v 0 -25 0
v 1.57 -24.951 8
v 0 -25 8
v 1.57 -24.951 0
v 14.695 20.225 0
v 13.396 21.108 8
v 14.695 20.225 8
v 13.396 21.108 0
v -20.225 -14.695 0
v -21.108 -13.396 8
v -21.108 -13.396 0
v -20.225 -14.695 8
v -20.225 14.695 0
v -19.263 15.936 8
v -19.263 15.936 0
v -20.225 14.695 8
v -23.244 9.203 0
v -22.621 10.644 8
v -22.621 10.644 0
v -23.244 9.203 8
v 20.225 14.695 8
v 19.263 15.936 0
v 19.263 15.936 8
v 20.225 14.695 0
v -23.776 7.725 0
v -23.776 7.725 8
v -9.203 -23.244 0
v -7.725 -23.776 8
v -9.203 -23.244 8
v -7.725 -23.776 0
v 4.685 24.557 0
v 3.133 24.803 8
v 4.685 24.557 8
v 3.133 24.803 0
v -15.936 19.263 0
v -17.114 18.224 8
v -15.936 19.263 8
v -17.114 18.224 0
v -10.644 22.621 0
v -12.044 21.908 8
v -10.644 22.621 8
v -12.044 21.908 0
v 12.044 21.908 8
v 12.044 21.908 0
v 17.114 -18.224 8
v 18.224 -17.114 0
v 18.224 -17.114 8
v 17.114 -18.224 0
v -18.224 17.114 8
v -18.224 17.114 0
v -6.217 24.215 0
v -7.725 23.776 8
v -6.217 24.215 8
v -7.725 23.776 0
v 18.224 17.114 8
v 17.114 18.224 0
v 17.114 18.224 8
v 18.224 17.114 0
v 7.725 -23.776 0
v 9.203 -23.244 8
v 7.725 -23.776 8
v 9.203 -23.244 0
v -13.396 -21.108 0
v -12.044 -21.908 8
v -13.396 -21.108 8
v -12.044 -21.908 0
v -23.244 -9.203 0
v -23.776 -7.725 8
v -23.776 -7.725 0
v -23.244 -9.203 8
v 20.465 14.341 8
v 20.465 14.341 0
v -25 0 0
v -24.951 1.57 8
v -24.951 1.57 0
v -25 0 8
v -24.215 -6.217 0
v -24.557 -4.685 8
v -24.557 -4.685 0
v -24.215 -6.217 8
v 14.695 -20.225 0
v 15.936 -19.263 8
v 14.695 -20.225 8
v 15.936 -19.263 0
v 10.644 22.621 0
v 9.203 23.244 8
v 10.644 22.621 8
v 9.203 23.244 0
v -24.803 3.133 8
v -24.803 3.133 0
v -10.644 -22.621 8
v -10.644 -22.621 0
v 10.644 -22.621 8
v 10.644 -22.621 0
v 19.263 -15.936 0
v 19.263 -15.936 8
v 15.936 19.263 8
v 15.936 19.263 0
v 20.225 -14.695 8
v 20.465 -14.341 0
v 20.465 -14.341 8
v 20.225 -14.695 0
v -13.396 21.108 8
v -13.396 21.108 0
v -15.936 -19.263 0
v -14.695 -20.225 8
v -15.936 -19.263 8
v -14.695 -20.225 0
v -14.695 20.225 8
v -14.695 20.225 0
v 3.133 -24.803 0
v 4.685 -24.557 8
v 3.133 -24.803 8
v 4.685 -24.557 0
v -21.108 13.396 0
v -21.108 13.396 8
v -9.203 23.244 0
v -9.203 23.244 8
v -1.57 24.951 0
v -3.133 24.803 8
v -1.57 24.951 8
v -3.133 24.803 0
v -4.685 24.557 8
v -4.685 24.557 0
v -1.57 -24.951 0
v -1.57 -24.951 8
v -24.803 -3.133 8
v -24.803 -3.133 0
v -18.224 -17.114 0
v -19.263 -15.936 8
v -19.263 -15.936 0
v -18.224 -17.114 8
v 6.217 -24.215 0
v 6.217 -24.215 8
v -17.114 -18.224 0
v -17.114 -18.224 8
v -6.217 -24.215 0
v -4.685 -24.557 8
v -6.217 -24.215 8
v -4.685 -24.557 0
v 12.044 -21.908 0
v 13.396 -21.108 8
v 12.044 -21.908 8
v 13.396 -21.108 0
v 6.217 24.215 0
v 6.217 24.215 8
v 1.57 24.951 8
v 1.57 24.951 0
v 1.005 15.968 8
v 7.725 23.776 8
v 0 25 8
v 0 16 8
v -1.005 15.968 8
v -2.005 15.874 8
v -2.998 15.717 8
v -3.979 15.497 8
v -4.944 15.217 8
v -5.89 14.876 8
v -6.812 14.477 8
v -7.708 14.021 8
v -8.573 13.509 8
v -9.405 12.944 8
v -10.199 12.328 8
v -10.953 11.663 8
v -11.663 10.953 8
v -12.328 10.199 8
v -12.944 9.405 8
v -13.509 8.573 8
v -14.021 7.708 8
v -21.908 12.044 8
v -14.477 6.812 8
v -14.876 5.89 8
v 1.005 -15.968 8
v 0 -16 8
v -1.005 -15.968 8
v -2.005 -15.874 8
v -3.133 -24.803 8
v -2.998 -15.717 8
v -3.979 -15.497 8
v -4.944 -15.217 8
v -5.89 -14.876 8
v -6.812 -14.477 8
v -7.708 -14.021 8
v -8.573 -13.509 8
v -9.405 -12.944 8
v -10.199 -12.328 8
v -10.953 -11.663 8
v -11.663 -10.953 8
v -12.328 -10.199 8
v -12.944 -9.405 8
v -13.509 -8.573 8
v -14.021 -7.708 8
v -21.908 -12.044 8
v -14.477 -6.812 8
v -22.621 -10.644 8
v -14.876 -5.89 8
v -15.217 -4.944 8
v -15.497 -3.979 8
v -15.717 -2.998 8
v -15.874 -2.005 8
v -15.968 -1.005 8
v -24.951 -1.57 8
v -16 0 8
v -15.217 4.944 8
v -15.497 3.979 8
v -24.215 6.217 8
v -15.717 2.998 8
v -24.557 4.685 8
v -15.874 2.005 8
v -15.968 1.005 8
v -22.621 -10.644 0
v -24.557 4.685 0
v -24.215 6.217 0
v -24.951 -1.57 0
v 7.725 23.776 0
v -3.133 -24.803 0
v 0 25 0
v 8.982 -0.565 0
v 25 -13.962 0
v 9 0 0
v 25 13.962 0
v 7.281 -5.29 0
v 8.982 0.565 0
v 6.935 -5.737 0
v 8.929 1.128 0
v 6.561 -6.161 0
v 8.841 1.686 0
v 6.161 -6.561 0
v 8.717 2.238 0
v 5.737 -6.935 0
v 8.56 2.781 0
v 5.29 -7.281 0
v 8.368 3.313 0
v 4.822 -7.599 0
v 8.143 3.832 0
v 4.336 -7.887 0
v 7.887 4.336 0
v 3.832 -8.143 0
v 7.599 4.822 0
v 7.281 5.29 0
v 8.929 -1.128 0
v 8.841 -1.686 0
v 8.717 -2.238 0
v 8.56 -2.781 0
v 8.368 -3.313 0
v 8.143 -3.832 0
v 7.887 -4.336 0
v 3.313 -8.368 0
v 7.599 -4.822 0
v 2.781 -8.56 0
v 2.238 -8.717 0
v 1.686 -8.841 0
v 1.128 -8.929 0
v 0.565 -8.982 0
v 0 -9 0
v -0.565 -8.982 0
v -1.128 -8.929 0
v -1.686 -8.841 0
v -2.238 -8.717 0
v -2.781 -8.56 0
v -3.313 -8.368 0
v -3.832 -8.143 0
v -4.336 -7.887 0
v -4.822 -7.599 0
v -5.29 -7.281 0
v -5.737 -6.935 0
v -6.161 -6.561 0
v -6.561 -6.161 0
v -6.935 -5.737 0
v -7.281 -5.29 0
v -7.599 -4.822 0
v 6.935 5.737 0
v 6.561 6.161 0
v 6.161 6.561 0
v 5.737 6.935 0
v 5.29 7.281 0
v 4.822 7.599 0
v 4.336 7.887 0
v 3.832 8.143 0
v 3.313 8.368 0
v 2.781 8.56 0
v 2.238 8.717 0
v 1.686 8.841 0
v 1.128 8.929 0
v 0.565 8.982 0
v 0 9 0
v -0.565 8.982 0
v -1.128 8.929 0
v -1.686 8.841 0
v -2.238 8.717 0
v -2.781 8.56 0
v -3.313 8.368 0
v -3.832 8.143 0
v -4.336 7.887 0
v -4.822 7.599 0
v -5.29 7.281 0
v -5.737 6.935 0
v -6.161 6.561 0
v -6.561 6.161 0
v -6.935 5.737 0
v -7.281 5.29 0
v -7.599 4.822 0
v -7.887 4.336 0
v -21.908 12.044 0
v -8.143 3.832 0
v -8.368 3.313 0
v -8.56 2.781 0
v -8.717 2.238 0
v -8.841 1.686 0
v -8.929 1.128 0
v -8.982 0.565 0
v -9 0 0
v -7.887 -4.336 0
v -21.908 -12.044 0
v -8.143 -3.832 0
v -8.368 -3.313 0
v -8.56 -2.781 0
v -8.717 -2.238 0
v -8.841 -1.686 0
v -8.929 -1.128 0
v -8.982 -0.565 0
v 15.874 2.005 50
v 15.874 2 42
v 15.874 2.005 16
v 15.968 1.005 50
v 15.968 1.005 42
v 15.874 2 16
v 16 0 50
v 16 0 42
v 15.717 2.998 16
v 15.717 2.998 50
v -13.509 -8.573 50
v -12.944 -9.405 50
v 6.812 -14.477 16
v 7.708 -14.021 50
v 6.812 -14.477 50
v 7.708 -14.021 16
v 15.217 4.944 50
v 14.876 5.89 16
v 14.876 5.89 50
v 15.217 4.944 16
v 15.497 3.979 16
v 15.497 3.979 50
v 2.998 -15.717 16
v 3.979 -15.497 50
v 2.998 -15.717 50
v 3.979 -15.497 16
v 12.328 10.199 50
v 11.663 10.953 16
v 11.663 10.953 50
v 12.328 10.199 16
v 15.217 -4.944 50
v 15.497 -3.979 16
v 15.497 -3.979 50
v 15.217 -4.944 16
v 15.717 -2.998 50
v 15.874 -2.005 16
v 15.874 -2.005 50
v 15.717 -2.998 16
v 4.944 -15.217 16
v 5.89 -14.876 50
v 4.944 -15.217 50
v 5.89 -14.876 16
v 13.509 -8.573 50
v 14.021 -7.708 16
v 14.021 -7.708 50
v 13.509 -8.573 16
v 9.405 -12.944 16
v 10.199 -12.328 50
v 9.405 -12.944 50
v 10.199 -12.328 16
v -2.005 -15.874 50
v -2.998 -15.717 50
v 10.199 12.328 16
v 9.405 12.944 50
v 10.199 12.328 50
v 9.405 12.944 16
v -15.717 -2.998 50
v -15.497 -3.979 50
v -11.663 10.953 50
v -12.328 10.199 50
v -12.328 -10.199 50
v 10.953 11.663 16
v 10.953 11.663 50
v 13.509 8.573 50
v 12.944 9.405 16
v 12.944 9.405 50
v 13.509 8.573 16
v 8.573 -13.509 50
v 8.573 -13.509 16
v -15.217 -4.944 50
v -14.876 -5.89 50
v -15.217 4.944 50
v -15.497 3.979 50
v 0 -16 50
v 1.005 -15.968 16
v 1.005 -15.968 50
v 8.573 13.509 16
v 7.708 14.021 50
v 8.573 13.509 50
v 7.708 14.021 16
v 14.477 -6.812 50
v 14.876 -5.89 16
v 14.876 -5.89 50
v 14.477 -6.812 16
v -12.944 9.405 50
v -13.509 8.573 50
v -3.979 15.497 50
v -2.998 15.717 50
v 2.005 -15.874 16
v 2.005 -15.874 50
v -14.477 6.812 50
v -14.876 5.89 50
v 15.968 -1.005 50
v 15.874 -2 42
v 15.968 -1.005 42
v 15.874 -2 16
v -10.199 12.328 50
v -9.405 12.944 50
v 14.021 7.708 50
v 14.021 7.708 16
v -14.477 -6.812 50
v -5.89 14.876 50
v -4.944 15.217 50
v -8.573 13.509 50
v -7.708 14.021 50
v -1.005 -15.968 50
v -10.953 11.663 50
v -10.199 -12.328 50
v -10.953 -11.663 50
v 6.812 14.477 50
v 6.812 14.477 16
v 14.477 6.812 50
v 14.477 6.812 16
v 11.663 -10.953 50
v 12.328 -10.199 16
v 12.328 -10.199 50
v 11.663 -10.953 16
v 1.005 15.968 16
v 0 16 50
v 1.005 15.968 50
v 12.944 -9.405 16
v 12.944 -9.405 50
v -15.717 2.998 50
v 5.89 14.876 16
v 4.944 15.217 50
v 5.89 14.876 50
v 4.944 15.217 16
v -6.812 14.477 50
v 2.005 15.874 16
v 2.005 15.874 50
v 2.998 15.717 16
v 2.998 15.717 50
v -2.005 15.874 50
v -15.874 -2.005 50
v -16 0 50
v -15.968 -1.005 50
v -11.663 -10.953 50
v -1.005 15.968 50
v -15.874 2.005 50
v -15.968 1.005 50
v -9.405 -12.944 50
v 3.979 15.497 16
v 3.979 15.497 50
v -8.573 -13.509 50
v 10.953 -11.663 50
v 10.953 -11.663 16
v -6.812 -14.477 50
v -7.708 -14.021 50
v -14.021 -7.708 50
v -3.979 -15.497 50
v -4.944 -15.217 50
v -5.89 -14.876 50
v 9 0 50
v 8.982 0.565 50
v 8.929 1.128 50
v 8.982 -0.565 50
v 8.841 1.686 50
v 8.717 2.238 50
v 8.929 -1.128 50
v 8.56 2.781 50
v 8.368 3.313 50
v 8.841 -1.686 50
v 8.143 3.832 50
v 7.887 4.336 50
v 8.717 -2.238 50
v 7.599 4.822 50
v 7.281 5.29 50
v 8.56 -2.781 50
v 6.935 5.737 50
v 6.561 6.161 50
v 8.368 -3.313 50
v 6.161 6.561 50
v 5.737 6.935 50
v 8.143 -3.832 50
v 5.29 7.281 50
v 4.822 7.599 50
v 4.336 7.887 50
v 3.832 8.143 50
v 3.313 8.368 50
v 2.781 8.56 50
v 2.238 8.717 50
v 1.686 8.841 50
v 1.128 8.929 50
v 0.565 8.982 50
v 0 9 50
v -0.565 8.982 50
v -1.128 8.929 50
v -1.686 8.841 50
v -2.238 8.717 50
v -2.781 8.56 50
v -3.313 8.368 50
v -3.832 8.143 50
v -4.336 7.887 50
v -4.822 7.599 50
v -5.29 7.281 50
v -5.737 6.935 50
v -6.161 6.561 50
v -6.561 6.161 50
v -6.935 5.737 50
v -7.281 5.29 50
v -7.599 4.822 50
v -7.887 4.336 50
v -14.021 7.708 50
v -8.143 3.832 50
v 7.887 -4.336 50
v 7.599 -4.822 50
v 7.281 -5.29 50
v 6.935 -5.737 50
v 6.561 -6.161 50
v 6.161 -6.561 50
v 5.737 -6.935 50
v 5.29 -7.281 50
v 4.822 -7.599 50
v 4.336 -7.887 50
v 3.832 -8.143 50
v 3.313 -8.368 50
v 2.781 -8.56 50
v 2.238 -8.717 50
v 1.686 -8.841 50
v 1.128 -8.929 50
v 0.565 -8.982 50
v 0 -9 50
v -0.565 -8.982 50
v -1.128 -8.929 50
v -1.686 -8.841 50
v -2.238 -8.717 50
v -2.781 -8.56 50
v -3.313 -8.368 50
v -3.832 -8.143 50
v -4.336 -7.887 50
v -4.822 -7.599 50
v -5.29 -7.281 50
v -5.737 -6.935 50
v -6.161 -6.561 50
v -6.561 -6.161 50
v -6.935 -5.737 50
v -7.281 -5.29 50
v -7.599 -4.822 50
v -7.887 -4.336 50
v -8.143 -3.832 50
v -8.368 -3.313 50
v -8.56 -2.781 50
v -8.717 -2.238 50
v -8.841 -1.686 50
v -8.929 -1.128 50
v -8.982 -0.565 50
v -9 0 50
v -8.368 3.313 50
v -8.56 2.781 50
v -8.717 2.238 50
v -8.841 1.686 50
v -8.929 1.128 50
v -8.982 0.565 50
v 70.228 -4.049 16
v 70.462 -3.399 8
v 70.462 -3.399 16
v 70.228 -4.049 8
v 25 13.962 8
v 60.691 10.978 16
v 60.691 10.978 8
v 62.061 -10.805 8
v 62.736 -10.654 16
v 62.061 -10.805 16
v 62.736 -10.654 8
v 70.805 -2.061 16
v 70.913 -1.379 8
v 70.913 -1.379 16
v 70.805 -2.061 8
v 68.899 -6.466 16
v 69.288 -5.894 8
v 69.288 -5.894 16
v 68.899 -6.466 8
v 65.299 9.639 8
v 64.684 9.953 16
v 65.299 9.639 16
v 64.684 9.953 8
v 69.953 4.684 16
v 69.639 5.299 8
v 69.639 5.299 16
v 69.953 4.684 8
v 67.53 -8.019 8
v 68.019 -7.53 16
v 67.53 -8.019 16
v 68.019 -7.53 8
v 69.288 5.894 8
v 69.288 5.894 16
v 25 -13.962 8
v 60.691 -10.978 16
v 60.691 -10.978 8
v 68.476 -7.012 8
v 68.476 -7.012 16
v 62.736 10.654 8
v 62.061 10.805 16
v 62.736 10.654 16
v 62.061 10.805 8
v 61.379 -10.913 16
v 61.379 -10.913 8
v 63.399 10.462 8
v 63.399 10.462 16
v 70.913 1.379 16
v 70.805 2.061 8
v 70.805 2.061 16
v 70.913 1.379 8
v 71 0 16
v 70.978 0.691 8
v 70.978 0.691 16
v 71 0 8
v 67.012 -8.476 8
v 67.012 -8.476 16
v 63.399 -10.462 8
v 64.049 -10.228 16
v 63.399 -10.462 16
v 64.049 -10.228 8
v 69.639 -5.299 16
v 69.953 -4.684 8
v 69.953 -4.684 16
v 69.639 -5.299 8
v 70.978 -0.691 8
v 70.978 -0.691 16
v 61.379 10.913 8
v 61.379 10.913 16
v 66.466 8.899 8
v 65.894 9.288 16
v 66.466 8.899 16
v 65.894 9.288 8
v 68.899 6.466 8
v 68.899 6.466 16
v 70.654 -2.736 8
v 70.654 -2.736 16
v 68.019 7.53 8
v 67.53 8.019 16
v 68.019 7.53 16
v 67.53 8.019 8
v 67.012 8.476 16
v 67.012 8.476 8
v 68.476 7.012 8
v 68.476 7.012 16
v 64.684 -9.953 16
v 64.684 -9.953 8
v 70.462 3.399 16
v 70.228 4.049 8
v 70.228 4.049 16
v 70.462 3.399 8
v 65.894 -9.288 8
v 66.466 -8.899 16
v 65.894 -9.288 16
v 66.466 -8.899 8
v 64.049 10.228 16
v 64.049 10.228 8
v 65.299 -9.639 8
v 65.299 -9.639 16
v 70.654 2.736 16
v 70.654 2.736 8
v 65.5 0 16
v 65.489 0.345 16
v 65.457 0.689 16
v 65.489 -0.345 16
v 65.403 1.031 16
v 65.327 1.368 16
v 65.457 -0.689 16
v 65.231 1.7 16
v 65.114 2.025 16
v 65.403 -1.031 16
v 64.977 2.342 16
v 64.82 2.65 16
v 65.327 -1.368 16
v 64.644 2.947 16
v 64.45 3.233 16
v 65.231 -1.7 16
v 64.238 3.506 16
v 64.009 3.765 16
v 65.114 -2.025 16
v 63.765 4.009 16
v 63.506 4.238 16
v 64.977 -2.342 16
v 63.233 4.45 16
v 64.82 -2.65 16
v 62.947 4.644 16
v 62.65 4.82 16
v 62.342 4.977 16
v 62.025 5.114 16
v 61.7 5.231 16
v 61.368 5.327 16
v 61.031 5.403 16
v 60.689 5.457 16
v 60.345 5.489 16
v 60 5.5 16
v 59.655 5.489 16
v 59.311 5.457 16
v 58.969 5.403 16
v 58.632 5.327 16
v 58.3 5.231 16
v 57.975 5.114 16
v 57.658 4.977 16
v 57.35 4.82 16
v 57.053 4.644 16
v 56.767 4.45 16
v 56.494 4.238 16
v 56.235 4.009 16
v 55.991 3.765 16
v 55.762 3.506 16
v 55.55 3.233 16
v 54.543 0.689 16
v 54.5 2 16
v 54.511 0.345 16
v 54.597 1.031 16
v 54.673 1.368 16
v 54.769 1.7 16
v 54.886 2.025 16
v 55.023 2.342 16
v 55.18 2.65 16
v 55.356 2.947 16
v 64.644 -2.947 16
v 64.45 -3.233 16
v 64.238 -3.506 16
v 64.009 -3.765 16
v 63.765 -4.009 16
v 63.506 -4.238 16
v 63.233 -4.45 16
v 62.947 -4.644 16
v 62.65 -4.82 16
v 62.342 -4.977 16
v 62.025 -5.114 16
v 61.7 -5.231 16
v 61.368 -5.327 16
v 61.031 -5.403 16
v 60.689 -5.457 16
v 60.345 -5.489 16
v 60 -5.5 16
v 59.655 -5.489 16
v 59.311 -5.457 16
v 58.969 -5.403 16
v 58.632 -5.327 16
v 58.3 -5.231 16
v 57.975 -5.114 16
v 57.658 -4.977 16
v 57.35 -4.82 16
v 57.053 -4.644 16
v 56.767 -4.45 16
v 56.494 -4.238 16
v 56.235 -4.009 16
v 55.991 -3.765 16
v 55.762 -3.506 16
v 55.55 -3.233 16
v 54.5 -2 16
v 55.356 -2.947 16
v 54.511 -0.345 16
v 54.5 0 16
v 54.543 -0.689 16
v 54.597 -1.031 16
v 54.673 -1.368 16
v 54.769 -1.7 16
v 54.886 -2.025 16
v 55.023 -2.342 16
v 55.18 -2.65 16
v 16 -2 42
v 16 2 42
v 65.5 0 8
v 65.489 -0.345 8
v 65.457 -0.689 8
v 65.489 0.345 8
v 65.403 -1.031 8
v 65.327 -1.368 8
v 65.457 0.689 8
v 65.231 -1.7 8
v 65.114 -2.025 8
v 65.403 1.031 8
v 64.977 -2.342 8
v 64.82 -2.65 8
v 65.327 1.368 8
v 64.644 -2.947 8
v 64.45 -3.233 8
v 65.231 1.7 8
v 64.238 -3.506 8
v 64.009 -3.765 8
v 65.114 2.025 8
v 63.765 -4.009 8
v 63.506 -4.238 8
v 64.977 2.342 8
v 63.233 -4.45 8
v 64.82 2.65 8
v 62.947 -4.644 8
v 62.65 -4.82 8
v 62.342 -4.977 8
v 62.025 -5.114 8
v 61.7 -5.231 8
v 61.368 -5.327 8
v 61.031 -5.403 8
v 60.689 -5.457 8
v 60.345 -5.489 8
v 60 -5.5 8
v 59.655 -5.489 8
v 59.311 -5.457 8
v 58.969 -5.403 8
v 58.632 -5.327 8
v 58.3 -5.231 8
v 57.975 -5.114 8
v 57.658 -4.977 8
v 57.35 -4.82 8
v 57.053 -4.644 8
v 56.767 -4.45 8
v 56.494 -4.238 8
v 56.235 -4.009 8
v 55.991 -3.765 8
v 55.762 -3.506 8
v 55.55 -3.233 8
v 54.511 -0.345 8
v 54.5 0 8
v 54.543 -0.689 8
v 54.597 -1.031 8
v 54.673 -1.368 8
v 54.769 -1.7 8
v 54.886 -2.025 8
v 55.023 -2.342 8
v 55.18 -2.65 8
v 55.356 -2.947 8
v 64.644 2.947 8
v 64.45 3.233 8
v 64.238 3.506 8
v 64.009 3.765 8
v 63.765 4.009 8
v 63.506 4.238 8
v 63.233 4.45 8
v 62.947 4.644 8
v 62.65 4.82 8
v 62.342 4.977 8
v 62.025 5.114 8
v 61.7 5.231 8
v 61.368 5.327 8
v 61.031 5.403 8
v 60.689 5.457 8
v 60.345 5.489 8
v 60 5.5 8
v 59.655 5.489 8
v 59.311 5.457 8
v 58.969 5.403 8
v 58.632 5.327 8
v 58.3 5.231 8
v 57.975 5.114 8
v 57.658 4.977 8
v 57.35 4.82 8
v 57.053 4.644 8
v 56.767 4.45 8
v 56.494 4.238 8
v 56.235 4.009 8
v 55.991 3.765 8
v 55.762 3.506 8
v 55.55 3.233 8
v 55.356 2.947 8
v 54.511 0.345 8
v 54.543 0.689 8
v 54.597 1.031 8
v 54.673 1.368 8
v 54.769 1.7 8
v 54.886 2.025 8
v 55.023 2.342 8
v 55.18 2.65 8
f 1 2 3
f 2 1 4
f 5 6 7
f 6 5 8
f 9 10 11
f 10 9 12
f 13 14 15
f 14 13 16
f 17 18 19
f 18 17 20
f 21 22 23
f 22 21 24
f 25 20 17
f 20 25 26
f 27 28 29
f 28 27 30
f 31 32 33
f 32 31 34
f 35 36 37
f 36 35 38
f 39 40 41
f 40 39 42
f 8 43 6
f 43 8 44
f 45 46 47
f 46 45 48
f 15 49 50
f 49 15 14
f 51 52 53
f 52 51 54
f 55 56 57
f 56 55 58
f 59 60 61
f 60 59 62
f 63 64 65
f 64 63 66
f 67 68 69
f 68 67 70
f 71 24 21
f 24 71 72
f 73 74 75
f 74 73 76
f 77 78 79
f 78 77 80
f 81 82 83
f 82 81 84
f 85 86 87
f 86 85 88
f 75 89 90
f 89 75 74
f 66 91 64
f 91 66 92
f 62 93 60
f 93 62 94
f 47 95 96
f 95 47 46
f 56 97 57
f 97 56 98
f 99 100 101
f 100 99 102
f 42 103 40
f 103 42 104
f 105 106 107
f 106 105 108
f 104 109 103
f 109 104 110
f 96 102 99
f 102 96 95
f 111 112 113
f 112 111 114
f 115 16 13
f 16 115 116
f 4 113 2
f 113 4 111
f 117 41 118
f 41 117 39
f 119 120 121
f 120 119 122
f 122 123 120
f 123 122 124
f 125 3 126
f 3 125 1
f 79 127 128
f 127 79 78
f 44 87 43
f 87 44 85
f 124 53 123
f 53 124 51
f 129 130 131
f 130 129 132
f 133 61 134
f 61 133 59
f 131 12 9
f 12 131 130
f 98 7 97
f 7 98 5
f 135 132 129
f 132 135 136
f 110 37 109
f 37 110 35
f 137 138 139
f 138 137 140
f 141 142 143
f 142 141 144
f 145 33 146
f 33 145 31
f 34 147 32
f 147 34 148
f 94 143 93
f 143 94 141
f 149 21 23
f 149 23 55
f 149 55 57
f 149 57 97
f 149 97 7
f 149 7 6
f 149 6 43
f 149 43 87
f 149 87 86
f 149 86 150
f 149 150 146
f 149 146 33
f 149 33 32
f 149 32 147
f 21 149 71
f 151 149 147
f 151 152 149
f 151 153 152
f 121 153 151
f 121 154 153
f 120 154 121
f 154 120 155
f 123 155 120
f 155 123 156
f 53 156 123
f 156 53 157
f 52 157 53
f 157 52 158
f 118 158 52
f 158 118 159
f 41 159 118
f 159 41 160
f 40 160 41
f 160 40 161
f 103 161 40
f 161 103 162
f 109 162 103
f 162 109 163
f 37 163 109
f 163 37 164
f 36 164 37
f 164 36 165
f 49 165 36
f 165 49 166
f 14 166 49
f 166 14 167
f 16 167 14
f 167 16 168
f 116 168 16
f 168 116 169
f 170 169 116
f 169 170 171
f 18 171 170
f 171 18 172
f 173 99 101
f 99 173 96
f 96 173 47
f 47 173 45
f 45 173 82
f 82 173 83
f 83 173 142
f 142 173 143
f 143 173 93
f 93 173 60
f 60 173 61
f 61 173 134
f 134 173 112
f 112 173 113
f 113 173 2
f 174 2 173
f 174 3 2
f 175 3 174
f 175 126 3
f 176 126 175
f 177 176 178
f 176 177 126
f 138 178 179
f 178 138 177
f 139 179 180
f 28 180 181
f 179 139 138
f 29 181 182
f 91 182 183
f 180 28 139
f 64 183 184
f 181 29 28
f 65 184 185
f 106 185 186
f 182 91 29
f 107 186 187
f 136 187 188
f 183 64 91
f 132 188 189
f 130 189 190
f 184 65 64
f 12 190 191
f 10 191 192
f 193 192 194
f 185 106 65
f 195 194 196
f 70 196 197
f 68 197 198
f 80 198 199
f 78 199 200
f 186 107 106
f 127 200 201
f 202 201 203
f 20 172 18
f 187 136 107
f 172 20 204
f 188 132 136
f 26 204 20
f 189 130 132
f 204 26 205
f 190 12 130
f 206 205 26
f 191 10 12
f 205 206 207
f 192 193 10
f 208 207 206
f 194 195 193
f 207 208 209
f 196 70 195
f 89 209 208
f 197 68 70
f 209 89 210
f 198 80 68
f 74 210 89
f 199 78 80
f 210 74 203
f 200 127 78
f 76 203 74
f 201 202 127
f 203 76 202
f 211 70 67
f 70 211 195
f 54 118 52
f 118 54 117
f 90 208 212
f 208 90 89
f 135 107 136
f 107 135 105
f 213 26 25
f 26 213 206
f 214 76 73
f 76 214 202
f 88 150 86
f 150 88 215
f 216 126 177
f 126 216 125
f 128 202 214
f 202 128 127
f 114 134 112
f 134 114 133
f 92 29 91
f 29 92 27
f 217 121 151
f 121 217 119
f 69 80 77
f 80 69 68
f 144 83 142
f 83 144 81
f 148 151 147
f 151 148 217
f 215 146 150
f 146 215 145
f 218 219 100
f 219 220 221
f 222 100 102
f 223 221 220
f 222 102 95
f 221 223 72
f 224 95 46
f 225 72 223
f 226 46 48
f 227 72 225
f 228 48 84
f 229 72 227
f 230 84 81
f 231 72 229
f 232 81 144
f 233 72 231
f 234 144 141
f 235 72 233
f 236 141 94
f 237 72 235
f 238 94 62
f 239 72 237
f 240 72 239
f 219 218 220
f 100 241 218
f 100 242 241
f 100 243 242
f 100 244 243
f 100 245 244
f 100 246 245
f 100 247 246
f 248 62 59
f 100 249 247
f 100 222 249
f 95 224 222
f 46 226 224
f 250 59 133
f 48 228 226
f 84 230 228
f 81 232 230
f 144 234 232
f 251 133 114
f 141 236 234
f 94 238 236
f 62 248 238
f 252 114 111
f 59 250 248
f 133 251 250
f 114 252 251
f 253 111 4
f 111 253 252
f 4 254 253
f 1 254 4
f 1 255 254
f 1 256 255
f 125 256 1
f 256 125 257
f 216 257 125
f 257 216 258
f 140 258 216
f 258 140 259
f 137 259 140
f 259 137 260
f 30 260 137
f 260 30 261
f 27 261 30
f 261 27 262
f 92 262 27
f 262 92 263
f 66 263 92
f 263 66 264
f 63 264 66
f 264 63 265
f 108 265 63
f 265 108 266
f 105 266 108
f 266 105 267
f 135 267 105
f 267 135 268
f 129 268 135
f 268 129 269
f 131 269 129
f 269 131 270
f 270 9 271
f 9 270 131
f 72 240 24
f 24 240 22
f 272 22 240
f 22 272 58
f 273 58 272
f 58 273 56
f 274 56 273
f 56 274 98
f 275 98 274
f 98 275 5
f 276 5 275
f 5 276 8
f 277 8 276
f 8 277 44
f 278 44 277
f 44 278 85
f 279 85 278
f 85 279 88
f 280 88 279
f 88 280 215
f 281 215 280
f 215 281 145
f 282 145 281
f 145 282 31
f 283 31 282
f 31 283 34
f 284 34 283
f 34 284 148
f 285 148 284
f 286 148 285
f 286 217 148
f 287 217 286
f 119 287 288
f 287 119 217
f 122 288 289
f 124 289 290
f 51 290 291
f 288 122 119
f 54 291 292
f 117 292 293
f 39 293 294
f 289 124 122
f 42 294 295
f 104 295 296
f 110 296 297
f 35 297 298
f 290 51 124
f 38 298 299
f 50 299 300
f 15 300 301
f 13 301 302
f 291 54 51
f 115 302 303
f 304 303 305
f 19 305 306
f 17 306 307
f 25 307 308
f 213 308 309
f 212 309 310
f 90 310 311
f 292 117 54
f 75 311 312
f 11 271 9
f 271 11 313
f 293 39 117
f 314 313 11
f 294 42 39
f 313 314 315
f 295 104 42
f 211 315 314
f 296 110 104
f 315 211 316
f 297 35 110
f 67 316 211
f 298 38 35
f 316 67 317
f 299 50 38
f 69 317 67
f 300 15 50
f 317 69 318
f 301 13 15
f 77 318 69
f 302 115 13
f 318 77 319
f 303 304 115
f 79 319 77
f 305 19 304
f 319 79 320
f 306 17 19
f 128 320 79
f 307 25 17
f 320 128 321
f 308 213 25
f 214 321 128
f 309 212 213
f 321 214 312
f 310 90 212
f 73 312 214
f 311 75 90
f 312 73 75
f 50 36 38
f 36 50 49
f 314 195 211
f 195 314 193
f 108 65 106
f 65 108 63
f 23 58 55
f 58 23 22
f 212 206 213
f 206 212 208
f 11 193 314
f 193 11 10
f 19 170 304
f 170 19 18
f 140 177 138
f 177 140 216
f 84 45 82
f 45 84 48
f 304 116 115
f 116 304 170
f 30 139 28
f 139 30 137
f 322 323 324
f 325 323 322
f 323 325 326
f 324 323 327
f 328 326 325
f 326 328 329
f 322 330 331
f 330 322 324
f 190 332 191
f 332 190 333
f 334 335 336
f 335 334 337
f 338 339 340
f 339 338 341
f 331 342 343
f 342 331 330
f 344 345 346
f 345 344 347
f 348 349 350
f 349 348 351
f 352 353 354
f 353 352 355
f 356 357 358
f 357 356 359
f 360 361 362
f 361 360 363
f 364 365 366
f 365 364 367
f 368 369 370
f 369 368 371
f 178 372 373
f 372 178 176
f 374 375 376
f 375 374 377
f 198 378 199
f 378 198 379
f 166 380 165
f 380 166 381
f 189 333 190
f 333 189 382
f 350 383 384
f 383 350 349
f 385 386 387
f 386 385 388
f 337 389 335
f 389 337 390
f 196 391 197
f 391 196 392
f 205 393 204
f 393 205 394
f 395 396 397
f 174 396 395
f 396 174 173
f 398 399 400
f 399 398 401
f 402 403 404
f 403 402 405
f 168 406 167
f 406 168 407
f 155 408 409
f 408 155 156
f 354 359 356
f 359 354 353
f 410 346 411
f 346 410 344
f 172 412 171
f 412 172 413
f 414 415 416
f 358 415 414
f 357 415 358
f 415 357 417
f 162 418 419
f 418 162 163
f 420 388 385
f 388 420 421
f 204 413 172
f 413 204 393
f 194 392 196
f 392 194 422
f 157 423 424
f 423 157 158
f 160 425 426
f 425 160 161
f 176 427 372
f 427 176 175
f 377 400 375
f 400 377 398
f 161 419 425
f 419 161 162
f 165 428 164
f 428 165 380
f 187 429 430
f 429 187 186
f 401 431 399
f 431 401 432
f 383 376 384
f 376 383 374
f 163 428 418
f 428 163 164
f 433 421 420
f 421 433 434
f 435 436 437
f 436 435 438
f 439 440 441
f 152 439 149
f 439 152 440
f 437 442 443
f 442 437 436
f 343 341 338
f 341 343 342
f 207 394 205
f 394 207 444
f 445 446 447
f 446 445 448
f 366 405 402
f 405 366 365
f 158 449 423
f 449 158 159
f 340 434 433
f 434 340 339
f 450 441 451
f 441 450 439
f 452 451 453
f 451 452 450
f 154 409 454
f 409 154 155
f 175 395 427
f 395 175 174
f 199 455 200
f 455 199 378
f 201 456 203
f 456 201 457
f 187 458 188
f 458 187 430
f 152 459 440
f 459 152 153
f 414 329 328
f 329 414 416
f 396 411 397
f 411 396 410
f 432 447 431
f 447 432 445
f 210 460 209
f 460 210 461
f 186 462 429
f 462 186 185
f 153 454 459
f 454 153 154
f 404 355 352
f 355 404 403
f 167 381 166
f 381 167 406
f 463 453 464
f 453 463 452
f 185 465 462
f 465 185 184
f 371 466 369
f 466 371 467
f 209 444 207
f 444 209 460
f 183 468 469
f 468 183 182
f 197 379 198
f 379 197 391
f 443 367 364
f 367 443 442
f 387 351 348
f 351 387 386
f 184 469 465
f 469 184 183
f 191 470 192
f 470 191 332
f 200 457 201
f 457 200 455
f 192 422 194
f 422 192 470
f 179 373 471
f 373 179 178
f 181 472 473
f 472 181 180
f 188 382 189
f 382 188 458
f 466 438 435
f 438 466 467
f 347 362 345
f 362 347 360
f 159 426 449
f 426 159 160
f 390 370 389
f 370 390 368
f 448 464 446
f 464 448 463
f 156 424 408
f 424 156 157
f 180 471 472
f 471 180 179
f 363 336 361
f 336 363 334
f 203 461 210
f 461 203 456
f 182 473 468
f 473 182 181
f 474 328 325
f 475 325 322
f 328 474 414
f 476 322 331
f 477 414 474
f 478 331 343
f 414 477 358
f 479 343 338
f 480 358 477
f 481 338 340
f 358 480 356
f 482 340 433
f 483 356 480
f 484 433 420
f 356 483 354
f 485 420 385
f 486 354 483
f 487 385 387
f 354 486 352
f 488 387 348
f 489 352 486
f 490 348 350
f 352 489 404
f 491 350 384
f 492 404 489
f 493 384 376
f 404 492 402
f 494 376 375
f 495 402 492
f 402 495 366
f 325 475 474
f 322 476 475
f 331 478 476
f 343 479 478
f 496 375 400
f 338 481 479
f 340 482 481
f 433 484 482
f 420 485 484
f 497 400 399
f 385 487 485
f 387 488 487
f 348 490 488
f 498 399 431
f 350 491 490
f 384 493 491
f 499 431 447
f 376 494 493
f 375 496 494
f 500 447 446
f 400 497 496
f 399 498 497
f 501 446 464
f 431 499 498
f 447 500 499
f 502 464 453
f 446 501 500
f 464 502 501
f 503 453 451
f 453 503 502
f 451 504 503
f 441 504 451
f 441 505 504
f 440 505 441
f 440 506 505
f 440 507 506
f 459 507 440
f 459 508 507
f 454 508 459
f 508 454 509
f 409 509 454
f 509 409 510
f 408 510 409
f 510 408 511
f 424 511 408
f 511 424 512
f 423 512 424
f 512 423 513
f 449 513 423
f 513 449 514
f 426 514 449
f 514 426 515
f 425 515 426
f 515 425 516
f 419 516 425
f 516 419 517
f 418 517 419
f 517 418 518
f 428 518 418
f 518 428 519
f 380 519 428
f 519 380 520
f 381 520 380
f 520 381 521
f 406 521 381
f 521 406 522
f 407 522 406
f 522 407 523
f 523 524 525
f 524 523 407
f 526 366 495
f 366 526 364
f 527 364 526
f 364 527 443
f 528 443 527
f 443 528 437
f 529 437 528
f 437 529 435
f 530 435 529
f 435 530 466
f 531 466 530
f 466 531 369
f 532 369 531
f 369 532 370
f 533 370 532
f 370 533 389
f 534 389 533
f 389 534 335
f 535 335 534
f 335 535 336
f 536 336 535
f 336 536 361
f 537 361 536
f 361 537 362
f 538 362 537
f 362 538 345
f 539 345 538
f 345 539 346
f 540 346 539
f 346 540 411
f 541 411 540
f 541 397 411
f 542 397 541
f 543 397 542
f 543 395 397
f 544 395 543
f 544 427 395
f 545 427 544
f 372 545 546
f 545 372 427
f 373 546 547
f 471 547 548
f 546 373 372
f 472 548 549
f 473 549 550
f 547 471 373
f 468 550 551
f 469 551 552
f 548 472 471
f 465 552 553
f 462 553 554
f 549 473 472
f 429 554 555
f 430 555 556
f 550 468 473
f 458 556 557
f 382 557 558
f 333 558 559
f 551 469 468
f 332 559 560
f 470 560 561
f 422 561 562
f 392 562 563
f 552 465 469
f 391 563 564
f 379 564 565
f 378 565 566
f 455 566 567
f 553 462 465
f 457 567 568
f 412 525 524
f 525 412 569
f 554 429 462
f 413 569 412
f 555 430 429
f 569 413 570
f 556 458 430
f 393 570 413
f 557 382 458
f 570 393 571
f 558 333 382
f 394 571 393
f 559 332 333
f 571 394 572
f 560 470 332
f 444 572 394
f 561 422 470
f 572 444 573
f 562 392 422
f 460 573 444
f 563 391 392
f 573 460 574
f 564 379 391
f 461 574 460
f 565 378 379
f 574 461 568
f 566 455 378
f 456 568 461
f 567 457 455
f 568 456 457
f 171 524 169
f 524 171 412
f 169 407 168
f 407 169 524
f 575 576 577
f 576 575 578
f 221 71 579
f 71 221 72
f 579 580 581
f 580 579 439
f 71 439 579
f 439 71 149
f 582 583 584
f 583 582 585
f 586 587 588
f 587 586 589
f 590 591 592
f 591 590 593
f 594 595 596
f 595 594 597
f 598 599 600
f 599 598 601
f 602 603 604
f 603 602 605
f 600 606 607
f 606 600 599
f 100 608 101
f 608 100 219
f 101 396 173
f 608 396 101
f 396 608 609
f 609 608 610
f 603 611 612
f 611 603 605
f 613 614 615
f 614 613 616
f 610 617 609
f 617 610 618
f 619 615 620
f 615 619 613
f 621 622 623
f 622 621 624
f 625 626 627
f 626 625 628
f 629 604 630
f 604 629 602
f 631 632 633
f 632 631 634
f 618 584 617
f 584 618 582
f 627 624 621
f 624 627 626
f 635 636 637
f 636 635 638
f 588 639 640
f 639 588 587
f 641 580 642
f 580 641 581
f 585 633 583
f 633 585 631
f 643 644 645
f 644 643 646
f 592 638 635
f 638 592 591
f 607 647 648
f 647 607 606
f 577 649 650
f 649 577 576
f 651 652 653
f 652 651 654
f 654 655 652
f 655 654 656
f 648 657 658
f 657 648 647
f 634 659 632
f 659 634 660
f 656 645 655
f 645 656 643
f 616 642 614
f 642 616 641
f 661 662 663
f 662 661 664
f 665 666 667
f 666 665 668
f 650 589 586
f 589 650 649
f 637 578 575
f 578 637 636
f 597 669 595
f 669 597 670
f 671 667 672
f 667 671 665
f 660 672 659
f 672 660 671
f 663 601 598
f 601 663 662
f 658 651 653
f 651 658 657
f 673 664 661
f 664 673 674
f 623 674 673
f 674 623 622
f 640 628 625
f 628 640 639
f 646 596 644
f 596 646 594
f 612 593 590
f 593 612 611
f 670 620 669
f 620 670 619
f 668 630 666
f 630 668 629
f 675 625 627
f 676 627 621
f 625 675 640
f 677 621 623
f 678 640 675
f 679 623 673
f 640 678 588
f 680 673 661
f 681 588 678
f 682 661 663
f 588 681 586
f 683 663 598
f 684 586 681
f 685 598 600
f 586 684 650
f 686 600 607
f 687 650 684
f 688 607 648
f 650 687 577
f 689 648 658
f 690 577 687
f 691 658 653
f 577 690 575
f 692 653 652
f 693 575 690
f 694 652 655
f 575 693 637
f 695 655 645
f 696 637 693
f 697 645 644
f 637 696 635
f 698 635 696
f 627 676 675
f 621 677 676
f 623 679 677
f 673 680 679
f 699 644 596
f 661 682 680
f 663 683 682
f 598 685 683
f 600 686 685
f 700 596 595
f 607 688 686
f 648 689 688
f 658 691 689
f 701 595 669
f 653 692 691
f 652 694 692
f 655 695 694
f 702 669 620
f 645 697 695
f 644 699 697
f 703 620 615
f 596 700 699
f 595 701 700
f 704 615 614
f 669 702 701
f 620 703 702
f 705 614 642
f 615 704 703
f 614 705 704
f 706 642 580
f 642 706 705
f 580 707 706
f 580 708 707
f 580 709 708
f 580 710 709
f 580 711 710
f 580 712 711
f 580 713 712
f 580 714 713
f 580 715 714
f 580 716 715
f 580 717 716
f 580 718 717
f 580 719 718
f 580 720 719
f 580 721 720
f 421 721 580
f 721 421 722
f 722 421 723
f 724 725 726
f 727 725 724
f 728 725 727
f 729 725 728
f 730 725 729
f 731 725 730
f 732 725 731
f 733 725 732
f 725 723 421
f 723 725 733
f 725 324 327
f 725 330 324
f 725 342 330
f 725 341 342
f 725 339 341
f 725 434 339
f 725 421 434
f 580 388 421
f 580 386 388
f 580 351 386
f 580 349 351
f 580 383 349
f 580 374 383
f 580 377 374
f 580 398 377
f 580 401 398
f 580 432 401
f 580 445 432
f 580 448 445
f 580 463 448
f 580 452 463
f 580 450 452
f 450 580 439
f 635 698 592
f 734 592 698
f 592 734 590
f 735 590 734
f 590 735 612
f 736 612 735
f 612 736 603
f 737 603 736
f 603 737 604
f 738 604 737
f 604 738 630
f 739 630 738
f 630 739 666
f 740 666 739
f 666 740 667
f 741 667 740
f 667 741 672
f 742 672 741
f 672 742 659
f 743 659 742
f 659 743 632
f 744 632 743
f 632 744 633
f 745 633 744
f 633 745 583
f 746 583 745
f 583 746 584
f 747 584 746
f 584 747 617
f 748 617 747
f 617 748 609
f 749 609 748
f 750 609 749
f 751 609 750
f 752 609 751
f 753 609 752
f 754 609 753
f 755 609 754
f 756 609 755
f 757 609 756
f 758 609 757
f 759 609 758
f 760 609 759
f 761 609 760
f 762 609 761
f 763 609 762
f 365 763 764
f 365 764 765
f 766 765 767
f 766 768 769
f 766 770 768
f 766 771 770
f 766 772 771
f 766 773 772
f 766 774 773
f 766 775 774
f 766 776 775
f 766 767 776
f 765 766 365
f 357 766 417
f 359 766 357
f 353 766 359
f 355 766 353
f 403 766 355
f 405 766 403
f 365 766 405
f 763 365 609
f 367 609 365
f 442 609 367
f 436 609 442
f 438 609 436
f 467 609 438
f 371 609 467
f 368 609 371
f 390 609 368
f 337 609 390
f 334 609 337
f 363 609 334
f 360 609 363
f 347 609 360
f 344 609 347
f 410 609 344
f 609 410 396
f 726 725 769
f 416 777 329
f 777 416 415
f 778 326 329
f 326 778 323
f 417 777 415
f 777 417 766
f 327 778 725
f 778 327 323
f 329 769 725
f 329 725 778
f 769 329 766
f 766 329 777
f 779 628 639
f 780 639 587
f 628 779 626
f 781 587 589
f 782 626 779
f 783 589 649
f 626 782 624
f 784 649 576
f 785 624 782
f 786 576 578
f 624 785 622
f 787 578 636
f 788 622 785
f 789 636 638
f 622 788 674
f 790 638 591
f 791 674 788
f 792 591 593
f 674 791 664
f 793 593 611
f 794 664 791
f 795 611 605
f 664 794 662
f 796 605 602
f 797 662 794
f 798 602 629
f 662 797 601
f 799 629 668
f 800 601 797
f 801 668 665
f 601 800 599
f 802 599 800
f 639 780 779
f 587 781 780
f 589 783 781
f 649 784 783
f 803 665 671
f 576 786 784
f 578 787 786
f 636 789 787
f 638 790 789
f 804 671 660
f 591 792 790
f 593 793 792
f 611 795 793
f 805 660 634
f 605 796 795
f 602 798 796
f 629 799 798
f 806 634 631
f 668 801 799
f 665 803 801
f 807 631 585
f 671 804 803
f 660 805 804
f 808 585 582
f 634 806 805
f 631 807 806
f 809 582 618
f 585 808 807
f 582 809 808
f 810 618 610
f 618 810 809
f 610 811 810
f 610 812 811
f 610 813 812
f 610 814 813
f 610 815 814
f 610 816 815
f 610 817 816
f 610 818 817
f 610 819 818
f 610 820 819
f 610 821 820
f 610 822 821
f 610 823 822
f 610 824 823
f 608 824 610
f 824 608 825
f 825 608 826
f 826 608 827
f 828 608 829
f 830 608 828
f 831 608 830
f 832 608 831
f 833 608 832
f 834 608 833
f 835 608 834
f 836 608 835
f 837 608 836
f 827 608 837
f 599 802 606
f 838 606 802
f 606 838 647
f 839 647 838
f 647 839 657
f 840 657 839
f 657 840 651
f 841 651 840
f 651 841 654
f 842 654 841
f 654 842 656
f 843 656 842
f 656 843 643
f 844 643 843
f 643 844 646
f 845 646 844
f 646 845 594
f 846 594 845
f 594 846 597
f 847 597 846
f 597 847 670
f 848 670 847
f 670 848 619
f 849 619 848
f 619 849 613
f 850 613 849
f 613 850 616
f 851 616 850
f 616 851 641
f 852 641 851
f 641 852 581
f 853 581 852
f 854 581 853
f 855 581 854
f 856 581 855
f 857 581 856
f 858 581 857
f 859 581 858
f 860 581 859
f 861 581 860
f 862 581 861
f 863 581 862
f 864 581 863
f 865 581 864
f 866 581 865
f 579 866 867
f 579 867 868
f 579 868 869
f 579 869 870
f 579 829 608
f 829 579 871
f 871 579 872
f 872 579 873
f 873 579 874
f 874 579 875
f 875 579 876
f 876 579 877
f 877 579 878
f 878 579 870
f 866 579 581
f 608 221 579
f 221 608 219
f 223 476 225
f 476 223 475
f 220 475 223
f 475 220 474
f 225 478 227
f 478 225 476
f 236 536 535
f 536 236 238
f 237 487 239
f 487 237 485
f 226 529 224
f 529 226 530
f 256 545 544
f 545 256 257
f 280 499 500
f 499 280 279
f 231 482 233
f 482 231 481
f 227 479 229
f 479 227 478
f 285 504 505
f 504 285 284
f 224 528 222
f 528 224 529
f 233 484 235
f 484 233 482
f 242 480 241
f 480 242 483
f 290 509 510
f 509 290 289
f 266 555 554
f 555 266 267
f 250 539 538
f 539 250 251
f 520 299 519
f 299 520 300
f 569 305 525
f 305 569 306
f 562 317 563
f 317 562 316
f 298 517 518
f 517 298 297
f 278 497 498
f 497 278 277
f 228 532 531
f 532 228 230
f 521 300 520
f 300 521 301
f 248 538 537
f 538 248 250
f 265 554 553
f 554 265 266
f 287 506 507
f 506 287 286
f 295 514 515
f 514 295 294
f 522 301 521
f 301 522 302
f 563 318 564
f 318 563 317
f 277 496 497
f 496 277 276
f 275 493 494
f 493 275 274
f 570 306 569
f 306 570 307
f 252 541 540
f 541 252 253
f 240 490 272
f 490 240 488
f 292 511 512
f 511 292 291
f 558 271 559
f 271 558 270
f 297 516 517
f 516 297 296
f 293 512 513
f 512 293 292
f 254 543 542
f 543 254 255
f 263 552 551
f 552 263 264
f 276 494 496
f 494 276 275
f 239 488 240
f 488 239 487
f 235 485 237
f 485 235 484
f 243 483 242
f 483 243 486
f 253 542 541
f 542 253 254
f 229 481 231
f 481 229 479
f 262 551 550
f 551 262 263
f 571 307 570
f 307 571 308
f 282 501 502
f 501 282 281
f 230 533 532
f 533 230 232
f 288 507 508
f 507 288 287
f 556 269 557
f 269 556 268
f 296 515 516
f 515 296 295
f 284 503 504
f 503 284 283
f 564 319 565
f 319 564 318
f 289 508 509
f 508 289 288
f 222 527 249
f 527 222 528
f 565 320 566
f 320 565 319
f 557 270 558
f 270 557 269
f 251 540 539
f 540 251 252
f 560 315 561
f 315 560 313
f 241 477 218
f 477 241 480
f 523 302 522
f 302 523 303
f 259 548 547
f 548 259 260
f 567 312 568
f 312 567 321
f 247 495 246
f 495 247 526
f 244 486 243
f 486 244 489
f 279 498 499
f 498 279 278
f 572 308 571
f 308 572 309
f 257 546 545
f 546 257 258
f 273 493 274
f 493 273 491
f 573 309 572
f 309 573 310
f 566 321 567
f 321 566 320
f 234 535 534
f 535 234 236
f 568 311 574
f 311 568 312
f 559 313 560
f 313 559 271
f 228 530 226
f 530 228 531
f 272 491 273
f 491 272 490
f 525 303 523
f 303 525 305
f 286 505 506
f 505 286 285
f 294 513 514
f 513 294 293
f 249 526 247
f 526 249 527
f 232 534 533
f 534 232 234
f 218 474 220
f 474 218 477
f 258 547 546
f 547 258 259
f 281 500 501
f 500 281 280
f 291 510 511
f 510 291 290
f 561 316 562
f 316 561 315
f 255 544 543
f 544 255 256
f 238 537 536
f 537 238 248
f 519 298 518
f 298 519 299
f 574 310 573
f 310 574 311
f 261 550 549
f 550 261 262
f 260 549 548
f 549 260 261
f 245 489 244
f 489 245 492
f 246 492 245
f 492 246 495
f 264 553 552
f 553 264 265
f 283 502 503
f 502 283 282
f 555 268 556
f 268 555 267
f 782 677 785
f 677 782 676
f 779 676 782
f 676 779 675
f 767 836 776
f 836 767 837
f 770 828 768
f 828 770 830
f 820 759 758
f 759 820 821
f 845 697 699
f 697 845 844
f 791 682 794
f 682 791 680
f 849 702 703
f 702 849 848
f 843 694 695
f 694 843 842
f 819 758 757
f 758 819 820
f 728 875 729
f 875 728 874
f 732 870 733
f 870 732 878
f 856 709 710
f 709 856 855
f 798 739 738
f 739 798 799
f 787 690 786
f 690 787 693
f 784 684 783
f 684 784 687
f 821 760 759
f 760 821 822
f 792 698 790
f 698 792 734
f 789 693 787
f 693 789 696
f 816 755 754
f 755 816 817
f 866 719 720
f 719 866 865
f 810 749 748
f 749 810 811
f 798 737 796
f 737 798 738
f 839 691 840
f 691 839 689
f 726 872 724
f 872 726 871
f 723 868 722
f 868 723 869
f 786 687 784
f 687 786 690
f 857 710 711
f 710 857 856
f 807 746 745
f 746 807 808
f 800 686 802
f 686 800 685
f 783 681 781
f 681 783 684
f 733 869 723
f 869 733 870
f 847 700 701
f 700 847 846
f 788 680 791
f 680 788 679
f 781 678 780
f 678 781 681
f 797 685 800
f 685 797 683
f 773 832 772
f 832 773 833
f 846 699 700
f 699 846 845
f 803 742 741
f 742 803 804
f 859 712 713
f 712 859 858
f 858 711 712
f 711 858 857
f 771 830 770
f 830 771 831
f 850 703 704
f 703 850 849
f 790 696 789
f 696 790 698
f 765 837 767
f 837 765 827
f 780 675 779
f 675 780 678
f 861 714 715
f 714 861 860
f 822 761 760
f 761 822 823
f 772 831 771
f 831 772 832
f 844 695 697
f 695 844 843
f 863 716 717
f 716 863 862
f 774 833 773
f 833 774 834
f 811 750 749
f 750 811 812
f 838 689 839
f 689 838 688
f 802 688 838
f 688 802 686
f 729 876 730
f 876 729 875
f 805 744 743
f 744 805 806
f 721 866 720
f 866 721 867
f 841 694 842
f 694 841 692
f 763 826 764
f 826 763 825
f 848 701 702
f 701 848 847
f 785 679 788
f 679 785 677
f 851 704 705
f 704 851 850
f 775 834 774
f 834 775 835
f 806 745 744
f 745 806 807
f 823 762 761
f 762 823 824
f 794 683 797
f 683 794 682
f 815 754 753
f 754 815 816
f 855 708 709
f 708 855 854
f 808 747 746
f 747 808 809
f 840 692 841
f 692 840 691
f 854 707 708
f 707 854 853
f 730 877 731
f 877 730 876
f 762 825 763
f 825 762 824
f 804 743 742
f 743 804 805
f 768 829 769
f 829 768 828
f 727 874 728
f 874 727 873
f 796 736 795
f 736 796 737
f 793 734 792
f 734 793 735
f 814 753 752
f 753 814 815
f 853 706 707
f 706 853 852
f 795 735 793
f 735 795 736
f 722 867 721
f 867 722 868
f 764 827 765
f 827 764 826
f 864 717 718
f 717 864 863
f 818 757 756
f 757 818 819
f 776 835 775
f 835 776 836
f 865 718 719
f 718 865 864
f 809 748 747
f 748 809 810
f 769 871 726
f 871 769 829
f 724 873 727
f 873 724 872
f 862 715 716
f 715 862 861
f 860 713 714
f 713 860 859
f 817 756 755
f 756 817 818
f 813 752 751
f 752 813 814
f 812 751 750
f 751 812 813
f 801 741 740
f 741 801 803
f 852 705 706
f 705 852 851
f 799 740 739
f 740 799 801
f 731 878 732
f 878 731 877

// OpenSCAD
// Parametric dimensions (in millimeters)
base_d = 50;
base_h = 8;
sleeve_od = 32;
sleeve_id = 18;
sleeve_h = 50;
arm_length = 60;
arm_end_d = 22;
arm_hole_d = 11;
arm_h = 16;
step_h = 8;
step_x = 25;
rib_t = 4;
rib_top_h = 42;

$fn = 100;

// Base section
module base_section() {
    cylinder(h = base_h, d = base_d);
}

// Tall sleeve solid
module sleeve_solid() {
    cylinder(h = sleeve_h, d = sleeve_od);
}

// Projecting arm solid
module arm_solid() {
    hull() {
        cylinder(h = arm_h, d = sleeve_od);
        translate([arm_length, 0, 0])
            cylinder(h = arm_h, d = arm_end_d);
    }
}

// Triangular stiffening rib
module triangular_rib() {
    rotate([90, 0, 0])
        linear_extrude(height = rib_t, center = true)
            polygon(points = [
                [sleeve_id / 2 + 1, arm_h - 1],
                [sleeve_id / 2 + 1, rib_top_h],
                [sleeve_od / 2, rib_top_h],
                [arm_length - arm_hole_d / 2, arm_h],
                [arm_length - arm_hole_d / 2, arm_h - 1]
            ]);
}

// Stepped underside cutaway
module underside_cutaway() {
    cut_length = arm_length + arm_end_d - step_x + 5;
    cut_width = sleeve_od * 2;
    translate([step_x, -cut_width / 2, -1])
        cube([cut_length, cut_width, step_h + 1]);
}

// Central bore
module central_bore() {
    translate([0, 0, -1])
        cylinder(h = sleeve_h + 2, d = sleeve_id);
}

// Arm end opening
module arm_opening() {
    translate([arm_length, 0, -1])
        cylinder(h = arm_h + 2, d = arm_hole_d);
}

// Main model
difference() {
    union() {
        base_section();
        sleeve_solid();
        arm_solid();
        triangular_rib();
    }
    underside_cutaway();
    central_bore();
    arm_opening();
}
